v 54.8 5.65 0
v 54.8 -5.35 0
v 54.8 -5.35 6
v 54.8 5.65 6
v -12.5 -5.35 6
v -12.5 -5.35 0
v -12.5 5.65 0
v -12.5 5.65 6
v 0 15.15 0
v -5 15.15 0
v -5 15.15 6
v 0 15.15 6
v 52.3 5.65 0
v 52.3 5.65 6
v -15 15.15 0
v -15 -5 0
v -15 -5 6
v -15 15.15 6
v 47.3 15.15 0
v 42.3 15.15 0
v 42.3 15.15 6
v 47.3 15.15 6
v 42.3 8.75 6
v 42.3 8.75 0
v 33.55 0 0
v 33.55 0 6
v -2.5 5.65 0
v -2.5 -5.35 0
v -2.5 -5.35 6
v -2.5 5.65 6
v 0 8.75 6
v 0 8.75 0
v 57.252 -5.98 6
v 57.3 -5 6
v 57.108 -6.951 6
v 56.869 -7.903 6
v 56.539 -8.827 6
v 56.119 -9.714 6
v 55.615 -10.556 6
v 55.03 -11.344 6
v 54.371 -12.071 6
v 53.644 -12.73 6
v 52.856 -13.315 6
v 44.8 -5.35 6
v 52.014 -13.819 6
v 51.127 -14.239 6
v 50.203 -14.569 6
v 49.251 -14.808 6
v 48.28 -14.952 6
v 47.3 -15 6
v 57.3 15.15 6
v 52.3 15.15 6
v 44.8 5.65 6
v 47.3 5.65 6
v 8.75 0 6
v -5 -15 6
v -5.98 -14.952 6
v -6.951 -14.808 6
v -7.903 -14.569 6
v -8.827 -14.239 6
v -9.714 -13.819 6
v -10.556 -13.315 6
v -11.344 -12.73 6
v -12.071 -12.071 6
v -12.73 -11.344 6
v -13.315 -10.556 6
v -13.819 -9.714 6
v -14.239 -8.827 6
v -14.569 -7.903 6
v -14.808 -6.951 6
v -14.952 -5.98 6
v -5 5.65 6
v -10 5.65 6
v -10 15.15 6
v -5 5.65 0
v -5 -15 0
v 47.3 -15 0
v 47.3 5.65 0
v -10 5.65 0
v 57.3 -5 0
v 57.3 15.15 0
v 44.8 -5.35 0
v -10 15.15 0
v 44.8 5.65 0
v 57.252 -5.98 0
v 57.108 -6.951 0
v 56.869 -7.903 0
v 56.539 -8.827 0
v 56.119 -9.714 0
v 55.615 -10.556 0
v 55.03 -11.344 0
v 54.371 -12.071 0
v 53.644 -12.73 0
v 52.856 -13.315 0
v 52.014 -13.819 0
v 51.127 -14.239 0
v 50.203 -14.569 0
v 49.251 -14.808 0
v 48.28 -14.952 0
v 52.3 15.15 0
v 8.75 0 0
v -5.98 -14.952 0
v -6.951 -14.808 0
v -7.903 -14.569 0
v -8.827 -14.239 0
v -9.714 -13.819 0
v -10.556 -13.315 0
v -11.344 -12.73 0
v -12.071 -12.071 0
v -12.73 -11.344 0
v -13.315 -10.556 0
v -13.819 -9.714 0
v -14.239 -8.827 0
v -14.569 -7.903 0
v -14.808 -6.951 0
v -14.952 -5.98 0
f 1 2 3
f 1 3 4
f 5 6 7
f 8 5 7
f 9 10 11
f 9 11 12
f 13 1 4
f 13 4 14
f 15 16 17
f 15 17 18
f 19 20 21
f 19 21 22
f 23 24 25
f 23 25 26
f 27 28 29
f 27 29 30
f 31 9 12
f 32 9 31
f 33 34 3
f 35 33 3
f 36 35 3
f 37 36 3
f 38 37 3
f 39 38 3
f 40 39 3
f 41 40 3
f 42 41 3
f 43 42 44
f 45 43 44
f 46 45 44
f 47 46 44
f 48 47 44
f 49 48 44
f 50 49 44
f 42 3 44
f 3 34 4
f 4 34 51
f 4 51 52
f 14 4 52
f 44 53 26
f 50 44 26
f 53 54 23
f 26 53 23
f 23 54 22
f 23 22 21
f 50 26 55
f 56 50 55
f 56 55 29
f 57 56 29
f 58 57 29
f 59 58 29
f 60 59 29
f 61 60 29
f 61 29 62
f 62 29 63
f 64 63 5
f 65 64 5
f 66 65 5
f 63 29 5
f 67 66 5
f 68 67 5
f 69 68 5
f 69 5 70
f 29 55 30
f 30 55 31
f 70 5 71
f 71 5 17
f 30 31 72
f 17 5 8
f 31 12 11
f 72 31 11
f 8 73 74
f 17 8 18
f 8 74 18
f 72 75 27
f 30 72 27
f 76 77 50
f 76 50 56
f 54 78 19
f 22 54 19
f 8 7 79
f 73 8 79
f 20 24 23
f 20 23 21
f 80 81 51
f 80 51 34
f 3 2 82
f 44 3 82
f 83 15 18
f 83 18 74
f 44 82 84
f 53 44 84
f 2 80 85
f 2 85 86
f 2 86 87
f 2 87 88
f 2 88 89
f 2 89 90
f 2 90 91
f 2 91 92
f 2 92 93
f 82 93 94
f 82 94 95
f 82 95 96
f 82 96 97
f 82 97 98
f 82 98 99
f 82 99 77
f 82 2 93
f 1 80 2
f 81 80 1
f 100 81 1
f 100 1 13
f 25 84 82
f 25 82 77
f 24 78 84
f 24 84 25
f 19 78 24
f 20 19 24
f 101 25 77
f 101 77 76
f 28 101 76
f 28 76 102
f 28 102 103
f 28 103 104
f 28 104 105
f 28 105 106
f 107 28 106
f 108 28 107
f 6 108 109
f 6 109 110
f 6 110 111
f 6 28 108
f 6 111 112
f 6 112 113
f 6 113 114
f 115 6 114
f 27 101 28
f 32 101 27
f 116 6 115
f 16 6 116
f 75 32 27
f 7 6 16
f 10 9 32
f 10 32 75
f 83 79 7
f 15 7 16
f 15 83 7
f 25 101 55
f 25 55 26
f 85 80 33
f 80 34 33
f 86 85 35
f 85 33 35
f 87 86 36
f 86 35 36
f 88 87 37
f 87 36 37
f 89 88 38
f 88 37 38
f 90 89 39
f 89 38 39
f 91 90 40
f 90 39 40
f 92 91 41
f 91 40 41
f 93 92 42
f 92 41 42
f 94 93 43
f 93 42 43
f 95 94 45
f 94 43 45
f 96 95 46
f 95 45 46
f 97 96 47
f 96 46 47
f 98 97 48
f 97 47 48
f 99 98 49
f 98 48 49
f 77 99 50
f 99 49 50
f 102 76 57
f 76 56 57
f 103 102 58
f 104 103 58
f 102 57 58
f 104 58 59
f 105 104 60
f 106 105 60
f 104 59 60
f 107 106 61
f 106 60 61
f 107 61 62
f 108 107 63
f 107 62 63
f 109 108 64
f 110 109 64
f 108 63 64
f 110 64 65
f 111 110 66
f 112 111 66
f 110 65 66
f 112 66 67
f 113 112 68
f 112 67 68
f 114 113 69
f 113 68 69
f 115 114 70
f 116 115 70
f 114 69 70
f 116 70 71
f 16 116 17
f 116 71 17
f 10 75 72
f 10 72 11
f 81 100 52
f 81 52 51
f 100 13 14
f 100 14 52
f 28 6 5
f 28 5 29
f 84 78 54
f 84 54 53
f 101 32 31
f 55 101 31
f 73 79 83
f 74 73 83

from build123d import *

# Parameters (mm, degrees)
BOSS_EXTRUDE1_DEPTH = 6
FILLET1_R           = 10
SKETCH2_W           = 5
SKETCH2_H           = 9.5
SKETCH2_W_2         = 10
SKETCH2_H_2         = 11
CUT_EXTRUDE1_DEPTH  = 60.571910327
CHAMFER1_SIZE       = 8.75


with BuildPart() as part:
    # Sketch1 → Boss-Extrude1 (new body)
    with BuildSketch(Plane.XY):
        Polygon((0, 0), (42.3, 0), (42.3, 15.15), (57.3, 15.15), (57.3, -15), (-15, -15), (-15, 15.15), (0, 15.15), align=None)
    extrude(amount=BOSS_EXTRUDE1_DEPTH)

    # Fillet1
    fillet1_edges = [part.edges().sort_by_distance(p)[0] for p in [
        (57.3, -15, 3),
        (-15, -15, 3),
    ]]
    fillet(fillet1_edges, radius=FILLET1_R)

    # Sketch2 → Cut-Extrude1 (cut, through all)
    with BuildSketch(Plane(origin=(0, 0, 0), x_dir=(-1, 0, 0), z_dir=(0, 0, -1))):
        with Locations((-49.8, 10.4)):
            Rectangle(SKETCH2_W, SKETCH2_H)
        with Locations((-49.8, 0.15)):
            Rectangle(SKETCH2_W_2, SKETCH2_H_2)
    cut_extrude1 = extrude(amount=-CUT_EXTRUDE1_DEPTH, mode=Mode.SUBTRACT)

    # Mirror1: Cut-Extrude1 across plane
    add(cut_extrude1.mirror(Plane(origin=(21.15, 0, 0), x_dir=(0, 0, 1), z_dir=(1, 0, 0))), mode=Mode.SUBTRACT)

    # Chamfer1
    chamfer1_edges = [part.edges().sort_by_distance(p)[0] for p in [
        (0, 0, 3),
        (42.3, 0, 3),
    ]]
    chamfer(chamfer1_edges, length=CHAMFER1_SIZE)


solid = part.part
